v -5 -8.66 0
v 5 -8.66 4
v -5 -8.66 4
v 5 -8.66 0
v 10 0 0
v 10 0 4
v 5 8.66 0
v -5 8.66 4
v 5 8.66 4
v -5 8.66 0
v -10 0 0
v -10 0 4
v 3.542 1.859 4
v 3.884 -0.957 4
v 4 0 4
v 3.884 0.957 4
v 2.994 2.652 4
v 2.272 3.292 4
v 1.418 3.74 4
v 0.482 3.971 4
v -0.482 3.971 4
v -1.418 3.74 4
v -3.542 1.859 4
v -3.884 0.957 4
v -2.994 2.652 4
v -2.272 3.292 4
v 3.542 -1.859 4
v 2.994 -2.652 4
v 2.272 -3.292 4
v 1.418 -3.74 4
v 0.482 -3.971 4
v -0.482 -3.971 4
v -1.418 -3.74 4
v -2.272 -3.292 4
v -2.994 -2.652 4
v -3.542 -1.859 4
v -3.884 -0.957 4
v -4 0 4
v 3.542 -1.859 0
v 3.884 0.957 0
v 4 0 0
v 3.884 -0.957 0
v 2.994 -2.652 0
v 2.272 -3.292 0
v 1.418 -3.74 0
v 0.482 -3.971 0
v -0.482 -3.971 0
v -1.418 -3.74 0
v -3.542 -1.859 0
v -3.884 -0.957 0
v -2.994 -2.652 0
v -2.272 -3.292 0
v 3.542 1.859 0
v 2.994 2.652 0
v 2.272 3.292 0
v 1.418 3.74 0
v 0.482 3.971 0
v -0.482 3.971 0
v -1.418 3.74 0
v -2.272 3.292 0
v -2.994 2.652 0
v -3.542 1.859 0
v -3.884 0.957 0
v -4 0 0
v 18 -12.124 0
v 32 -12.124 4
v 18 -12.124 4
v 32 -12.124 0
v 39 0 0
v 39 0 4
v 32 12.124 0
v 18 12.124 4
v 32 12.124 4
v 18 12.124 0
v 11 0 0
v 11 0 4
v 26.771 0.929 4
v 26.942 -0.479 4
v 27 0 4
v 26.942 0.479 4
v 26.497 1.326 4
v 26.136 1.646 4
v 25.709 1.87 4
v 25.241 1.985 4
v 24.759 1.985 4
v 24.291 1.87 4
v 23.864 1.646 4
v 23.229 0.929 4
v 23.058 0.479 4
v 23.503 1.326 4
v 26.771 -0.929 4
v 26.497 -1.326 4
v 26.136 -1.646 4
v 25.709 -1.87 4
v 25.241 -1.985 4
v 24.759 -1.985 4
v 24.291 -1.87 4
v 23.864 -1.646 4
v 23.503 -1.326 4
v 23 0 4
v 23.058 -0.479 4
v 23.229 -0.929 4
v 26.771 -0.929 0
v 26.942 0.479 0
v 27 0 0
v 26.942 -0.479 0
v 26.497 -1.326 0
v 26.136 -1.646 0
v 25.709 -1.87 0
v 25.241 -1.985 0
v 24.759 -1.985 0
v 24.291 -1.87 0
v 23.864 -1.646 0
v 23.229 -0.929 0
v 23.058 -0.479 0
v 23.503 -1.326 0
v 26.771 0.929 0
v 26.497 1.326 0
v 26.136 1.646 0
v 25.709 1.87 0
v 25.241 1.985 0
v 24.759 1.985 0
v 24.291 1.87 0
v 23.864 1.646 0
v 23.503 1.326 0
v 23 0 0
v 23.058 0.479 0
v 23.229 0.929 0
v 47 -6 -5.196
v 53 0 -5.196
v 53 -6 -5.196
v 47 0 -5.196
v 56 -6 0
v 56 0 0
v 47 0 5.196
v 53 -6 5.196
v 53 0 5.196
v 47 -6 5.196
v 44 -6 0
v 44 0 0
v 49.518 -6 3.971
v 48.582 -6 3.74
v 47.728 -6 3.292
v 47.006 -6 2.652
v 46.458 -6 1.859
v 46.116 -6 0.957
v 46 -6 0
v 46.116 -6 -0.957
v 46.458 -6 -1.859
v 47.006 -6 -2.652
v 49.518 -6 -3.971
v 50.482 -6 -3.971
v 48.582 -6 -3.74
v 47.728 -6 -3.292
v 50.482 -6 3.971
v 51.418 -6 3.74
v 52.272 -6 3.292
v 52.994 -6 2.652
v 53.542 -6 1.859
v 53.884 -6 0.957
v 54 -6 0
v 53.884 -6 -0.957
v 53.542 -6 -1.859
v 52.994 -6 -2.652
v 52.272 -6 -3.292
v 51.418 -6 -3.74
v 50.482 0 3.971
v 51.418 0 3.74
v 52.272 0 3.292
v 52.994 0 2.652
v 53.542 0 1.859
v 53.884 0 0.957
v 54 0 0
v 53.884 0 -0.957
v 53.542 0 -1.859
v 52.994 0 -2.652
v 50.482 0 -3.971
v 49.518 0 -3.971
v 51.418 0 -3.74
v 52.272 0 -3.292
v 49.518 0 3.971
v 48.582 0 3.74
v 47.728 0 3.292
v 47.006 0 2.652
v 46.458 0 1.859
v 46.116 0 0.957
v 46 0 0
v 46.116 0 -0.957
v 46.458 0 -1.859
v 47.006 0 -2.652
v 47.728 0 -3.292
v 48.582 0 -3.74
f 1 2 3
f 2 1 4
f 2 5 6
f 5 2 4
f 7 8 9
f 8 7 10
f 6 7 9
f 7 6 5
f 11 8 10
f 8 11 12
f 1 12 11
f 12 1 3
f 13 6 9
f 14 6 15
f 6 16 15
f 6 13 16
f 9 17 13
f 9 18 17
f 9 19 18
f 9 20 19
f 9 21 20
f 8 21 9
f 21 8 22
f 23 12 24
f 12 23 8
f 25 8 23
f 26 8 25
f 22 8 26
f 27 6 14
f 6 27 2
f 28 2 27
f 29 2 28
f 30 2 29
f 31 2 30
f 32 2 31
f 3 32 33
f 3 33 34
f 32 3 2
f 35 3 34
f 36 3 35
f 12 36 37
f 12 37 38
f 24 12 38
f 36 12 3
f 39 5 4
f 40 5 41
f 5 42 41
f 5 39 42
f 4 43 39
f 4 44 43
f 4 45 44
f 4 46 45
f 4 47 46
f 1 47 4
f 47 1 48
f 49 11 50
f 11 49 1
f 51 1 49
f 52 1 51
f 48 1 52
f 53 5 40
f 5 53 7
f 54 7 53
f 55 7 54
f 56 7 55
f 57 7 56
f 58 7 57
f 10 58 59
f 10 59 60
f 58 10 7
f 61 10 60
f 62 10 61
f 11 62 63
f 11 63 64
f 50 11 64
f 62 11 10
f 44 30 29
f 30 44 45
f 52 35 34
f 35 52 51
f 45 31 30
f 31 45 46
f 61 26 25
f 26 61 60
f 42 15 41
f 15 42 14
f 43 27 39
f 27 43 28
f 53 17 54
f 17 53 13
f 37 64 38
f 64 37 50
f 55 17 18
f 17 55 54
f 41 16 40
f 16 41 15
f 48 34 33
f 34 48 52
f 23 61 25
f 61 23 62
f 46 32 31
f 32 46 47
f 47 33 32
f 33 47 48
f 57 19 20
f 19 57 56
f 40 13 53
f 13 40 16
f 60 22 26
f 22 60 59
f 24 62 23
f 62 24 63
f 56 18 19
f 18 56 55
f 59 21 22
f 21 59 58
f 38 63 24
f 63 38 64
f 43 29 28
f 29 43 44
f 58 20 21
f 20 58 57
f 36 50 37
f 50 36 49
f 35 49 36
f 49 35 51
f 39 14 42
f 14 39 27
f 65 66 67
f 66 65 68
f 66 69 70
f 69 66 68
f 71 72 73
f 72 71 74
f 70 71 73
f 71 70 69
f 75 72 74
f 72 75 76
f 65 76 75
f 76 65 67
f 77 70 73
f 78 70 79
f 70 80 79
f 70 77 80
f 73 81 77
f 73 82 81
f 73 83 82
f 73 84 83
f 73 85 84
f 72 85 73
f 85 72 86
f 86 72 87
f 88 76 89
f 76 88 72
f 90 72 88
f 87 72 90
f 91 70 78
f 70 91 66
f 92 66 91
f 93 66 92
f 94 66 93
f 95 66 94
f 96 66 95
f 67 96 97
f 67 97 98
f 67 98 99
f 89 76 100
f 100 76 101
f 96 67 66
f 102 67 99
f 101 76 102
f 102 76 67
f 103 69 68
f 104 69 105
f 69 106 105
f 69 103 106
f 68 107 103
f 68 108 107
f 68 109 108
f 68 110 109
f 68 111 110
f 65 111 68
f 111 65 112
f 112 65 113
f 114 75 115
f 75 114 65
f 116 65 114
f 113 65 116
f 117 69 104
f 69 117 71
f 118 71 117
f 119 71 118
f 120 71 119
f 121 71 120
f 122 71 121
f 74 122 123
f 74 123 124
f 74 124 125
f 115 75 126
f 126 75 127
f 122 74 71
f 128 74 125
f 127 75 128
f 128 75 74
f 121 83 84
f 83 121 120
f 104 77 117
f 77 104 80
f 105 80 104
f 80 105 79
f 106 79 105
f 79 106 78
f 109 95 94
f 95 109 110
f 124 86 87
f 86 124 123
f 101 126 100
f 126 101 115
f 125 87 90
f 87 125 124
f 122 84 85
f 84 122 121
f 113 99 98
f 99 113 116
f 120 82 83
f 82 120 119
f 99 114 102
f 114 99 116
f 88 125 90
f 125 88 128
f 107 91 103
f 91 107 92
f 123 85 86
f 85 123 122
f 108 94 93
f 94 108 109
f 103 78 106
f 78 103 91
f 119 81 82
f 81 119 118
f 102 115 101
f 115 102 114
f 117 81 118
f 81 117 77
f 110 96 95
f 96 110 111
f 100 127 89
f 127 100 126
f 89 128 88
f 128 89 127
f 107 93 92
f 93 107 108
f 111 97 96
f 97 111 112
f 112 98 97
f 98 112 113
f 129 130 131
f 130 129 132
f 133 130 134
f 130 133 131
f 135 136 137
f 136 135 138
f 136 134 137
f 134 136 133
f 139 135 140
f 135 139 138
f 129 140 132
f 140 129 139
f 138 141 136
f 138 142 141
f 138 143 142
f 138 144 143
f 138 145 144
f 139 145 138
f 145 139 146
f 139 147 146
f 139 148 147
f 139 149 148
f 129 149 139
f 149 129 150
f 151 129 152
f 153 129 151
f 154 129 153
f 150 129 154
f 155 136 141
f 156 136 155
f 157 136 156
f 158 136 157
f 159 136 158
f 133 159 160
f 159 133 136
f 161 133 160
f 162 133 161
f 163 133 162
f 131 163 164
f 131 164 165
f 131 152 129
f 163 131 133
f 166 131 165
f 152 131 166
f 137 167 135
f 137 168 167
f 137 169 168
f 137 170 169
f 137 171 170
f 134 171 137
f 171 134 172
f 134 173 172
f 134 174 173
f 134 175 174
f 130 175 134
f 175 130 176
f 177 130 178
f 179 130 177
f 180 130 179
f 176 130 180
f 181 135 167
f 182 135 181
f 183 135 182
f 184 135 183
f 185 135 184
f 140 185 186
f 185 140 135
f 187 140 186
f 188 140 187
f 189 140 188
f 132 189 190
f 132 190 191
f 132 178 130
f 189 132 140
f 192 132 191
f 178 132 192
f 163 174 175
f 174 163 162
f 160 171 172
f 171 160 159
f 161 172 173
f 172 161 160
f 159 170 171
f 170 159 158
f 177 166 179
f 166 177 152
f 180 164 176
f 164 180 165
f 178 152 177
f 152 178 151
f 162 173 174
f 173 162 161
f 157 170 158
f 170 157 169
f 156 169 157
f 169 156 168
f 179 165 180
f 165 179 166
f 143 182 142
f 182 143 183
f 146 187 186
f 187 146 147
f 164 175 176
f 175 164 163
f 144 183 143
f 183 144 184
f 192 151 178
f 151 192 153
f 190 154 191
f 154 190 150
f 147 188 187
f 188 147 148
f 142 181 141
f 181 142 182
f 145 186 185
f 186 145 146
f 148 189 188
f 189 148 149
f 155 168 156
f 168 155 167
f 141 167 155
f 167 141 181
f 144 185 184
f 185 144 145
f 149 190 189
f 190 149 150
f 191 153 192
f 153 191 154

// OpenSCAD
module piulita(raza_exterior, raza_interior, grosime)
{
    difference(){
        cylinder(h = grosime, r = raza_exterior, $fn = 6);
    
        translate ([0, 0, -1]) cylinder(h = grosime + 2, r = raza_interior, $fn = 26);
    }
}


color ("red") piulita(10, 4, 4);
color ("yellow") translate ([25, 0, 0]) piulita(14, 2, 4);

color("blue") translate ([50, 0, 0]) rotate([90, 0, 0]) piulita(6, 4, 6);
